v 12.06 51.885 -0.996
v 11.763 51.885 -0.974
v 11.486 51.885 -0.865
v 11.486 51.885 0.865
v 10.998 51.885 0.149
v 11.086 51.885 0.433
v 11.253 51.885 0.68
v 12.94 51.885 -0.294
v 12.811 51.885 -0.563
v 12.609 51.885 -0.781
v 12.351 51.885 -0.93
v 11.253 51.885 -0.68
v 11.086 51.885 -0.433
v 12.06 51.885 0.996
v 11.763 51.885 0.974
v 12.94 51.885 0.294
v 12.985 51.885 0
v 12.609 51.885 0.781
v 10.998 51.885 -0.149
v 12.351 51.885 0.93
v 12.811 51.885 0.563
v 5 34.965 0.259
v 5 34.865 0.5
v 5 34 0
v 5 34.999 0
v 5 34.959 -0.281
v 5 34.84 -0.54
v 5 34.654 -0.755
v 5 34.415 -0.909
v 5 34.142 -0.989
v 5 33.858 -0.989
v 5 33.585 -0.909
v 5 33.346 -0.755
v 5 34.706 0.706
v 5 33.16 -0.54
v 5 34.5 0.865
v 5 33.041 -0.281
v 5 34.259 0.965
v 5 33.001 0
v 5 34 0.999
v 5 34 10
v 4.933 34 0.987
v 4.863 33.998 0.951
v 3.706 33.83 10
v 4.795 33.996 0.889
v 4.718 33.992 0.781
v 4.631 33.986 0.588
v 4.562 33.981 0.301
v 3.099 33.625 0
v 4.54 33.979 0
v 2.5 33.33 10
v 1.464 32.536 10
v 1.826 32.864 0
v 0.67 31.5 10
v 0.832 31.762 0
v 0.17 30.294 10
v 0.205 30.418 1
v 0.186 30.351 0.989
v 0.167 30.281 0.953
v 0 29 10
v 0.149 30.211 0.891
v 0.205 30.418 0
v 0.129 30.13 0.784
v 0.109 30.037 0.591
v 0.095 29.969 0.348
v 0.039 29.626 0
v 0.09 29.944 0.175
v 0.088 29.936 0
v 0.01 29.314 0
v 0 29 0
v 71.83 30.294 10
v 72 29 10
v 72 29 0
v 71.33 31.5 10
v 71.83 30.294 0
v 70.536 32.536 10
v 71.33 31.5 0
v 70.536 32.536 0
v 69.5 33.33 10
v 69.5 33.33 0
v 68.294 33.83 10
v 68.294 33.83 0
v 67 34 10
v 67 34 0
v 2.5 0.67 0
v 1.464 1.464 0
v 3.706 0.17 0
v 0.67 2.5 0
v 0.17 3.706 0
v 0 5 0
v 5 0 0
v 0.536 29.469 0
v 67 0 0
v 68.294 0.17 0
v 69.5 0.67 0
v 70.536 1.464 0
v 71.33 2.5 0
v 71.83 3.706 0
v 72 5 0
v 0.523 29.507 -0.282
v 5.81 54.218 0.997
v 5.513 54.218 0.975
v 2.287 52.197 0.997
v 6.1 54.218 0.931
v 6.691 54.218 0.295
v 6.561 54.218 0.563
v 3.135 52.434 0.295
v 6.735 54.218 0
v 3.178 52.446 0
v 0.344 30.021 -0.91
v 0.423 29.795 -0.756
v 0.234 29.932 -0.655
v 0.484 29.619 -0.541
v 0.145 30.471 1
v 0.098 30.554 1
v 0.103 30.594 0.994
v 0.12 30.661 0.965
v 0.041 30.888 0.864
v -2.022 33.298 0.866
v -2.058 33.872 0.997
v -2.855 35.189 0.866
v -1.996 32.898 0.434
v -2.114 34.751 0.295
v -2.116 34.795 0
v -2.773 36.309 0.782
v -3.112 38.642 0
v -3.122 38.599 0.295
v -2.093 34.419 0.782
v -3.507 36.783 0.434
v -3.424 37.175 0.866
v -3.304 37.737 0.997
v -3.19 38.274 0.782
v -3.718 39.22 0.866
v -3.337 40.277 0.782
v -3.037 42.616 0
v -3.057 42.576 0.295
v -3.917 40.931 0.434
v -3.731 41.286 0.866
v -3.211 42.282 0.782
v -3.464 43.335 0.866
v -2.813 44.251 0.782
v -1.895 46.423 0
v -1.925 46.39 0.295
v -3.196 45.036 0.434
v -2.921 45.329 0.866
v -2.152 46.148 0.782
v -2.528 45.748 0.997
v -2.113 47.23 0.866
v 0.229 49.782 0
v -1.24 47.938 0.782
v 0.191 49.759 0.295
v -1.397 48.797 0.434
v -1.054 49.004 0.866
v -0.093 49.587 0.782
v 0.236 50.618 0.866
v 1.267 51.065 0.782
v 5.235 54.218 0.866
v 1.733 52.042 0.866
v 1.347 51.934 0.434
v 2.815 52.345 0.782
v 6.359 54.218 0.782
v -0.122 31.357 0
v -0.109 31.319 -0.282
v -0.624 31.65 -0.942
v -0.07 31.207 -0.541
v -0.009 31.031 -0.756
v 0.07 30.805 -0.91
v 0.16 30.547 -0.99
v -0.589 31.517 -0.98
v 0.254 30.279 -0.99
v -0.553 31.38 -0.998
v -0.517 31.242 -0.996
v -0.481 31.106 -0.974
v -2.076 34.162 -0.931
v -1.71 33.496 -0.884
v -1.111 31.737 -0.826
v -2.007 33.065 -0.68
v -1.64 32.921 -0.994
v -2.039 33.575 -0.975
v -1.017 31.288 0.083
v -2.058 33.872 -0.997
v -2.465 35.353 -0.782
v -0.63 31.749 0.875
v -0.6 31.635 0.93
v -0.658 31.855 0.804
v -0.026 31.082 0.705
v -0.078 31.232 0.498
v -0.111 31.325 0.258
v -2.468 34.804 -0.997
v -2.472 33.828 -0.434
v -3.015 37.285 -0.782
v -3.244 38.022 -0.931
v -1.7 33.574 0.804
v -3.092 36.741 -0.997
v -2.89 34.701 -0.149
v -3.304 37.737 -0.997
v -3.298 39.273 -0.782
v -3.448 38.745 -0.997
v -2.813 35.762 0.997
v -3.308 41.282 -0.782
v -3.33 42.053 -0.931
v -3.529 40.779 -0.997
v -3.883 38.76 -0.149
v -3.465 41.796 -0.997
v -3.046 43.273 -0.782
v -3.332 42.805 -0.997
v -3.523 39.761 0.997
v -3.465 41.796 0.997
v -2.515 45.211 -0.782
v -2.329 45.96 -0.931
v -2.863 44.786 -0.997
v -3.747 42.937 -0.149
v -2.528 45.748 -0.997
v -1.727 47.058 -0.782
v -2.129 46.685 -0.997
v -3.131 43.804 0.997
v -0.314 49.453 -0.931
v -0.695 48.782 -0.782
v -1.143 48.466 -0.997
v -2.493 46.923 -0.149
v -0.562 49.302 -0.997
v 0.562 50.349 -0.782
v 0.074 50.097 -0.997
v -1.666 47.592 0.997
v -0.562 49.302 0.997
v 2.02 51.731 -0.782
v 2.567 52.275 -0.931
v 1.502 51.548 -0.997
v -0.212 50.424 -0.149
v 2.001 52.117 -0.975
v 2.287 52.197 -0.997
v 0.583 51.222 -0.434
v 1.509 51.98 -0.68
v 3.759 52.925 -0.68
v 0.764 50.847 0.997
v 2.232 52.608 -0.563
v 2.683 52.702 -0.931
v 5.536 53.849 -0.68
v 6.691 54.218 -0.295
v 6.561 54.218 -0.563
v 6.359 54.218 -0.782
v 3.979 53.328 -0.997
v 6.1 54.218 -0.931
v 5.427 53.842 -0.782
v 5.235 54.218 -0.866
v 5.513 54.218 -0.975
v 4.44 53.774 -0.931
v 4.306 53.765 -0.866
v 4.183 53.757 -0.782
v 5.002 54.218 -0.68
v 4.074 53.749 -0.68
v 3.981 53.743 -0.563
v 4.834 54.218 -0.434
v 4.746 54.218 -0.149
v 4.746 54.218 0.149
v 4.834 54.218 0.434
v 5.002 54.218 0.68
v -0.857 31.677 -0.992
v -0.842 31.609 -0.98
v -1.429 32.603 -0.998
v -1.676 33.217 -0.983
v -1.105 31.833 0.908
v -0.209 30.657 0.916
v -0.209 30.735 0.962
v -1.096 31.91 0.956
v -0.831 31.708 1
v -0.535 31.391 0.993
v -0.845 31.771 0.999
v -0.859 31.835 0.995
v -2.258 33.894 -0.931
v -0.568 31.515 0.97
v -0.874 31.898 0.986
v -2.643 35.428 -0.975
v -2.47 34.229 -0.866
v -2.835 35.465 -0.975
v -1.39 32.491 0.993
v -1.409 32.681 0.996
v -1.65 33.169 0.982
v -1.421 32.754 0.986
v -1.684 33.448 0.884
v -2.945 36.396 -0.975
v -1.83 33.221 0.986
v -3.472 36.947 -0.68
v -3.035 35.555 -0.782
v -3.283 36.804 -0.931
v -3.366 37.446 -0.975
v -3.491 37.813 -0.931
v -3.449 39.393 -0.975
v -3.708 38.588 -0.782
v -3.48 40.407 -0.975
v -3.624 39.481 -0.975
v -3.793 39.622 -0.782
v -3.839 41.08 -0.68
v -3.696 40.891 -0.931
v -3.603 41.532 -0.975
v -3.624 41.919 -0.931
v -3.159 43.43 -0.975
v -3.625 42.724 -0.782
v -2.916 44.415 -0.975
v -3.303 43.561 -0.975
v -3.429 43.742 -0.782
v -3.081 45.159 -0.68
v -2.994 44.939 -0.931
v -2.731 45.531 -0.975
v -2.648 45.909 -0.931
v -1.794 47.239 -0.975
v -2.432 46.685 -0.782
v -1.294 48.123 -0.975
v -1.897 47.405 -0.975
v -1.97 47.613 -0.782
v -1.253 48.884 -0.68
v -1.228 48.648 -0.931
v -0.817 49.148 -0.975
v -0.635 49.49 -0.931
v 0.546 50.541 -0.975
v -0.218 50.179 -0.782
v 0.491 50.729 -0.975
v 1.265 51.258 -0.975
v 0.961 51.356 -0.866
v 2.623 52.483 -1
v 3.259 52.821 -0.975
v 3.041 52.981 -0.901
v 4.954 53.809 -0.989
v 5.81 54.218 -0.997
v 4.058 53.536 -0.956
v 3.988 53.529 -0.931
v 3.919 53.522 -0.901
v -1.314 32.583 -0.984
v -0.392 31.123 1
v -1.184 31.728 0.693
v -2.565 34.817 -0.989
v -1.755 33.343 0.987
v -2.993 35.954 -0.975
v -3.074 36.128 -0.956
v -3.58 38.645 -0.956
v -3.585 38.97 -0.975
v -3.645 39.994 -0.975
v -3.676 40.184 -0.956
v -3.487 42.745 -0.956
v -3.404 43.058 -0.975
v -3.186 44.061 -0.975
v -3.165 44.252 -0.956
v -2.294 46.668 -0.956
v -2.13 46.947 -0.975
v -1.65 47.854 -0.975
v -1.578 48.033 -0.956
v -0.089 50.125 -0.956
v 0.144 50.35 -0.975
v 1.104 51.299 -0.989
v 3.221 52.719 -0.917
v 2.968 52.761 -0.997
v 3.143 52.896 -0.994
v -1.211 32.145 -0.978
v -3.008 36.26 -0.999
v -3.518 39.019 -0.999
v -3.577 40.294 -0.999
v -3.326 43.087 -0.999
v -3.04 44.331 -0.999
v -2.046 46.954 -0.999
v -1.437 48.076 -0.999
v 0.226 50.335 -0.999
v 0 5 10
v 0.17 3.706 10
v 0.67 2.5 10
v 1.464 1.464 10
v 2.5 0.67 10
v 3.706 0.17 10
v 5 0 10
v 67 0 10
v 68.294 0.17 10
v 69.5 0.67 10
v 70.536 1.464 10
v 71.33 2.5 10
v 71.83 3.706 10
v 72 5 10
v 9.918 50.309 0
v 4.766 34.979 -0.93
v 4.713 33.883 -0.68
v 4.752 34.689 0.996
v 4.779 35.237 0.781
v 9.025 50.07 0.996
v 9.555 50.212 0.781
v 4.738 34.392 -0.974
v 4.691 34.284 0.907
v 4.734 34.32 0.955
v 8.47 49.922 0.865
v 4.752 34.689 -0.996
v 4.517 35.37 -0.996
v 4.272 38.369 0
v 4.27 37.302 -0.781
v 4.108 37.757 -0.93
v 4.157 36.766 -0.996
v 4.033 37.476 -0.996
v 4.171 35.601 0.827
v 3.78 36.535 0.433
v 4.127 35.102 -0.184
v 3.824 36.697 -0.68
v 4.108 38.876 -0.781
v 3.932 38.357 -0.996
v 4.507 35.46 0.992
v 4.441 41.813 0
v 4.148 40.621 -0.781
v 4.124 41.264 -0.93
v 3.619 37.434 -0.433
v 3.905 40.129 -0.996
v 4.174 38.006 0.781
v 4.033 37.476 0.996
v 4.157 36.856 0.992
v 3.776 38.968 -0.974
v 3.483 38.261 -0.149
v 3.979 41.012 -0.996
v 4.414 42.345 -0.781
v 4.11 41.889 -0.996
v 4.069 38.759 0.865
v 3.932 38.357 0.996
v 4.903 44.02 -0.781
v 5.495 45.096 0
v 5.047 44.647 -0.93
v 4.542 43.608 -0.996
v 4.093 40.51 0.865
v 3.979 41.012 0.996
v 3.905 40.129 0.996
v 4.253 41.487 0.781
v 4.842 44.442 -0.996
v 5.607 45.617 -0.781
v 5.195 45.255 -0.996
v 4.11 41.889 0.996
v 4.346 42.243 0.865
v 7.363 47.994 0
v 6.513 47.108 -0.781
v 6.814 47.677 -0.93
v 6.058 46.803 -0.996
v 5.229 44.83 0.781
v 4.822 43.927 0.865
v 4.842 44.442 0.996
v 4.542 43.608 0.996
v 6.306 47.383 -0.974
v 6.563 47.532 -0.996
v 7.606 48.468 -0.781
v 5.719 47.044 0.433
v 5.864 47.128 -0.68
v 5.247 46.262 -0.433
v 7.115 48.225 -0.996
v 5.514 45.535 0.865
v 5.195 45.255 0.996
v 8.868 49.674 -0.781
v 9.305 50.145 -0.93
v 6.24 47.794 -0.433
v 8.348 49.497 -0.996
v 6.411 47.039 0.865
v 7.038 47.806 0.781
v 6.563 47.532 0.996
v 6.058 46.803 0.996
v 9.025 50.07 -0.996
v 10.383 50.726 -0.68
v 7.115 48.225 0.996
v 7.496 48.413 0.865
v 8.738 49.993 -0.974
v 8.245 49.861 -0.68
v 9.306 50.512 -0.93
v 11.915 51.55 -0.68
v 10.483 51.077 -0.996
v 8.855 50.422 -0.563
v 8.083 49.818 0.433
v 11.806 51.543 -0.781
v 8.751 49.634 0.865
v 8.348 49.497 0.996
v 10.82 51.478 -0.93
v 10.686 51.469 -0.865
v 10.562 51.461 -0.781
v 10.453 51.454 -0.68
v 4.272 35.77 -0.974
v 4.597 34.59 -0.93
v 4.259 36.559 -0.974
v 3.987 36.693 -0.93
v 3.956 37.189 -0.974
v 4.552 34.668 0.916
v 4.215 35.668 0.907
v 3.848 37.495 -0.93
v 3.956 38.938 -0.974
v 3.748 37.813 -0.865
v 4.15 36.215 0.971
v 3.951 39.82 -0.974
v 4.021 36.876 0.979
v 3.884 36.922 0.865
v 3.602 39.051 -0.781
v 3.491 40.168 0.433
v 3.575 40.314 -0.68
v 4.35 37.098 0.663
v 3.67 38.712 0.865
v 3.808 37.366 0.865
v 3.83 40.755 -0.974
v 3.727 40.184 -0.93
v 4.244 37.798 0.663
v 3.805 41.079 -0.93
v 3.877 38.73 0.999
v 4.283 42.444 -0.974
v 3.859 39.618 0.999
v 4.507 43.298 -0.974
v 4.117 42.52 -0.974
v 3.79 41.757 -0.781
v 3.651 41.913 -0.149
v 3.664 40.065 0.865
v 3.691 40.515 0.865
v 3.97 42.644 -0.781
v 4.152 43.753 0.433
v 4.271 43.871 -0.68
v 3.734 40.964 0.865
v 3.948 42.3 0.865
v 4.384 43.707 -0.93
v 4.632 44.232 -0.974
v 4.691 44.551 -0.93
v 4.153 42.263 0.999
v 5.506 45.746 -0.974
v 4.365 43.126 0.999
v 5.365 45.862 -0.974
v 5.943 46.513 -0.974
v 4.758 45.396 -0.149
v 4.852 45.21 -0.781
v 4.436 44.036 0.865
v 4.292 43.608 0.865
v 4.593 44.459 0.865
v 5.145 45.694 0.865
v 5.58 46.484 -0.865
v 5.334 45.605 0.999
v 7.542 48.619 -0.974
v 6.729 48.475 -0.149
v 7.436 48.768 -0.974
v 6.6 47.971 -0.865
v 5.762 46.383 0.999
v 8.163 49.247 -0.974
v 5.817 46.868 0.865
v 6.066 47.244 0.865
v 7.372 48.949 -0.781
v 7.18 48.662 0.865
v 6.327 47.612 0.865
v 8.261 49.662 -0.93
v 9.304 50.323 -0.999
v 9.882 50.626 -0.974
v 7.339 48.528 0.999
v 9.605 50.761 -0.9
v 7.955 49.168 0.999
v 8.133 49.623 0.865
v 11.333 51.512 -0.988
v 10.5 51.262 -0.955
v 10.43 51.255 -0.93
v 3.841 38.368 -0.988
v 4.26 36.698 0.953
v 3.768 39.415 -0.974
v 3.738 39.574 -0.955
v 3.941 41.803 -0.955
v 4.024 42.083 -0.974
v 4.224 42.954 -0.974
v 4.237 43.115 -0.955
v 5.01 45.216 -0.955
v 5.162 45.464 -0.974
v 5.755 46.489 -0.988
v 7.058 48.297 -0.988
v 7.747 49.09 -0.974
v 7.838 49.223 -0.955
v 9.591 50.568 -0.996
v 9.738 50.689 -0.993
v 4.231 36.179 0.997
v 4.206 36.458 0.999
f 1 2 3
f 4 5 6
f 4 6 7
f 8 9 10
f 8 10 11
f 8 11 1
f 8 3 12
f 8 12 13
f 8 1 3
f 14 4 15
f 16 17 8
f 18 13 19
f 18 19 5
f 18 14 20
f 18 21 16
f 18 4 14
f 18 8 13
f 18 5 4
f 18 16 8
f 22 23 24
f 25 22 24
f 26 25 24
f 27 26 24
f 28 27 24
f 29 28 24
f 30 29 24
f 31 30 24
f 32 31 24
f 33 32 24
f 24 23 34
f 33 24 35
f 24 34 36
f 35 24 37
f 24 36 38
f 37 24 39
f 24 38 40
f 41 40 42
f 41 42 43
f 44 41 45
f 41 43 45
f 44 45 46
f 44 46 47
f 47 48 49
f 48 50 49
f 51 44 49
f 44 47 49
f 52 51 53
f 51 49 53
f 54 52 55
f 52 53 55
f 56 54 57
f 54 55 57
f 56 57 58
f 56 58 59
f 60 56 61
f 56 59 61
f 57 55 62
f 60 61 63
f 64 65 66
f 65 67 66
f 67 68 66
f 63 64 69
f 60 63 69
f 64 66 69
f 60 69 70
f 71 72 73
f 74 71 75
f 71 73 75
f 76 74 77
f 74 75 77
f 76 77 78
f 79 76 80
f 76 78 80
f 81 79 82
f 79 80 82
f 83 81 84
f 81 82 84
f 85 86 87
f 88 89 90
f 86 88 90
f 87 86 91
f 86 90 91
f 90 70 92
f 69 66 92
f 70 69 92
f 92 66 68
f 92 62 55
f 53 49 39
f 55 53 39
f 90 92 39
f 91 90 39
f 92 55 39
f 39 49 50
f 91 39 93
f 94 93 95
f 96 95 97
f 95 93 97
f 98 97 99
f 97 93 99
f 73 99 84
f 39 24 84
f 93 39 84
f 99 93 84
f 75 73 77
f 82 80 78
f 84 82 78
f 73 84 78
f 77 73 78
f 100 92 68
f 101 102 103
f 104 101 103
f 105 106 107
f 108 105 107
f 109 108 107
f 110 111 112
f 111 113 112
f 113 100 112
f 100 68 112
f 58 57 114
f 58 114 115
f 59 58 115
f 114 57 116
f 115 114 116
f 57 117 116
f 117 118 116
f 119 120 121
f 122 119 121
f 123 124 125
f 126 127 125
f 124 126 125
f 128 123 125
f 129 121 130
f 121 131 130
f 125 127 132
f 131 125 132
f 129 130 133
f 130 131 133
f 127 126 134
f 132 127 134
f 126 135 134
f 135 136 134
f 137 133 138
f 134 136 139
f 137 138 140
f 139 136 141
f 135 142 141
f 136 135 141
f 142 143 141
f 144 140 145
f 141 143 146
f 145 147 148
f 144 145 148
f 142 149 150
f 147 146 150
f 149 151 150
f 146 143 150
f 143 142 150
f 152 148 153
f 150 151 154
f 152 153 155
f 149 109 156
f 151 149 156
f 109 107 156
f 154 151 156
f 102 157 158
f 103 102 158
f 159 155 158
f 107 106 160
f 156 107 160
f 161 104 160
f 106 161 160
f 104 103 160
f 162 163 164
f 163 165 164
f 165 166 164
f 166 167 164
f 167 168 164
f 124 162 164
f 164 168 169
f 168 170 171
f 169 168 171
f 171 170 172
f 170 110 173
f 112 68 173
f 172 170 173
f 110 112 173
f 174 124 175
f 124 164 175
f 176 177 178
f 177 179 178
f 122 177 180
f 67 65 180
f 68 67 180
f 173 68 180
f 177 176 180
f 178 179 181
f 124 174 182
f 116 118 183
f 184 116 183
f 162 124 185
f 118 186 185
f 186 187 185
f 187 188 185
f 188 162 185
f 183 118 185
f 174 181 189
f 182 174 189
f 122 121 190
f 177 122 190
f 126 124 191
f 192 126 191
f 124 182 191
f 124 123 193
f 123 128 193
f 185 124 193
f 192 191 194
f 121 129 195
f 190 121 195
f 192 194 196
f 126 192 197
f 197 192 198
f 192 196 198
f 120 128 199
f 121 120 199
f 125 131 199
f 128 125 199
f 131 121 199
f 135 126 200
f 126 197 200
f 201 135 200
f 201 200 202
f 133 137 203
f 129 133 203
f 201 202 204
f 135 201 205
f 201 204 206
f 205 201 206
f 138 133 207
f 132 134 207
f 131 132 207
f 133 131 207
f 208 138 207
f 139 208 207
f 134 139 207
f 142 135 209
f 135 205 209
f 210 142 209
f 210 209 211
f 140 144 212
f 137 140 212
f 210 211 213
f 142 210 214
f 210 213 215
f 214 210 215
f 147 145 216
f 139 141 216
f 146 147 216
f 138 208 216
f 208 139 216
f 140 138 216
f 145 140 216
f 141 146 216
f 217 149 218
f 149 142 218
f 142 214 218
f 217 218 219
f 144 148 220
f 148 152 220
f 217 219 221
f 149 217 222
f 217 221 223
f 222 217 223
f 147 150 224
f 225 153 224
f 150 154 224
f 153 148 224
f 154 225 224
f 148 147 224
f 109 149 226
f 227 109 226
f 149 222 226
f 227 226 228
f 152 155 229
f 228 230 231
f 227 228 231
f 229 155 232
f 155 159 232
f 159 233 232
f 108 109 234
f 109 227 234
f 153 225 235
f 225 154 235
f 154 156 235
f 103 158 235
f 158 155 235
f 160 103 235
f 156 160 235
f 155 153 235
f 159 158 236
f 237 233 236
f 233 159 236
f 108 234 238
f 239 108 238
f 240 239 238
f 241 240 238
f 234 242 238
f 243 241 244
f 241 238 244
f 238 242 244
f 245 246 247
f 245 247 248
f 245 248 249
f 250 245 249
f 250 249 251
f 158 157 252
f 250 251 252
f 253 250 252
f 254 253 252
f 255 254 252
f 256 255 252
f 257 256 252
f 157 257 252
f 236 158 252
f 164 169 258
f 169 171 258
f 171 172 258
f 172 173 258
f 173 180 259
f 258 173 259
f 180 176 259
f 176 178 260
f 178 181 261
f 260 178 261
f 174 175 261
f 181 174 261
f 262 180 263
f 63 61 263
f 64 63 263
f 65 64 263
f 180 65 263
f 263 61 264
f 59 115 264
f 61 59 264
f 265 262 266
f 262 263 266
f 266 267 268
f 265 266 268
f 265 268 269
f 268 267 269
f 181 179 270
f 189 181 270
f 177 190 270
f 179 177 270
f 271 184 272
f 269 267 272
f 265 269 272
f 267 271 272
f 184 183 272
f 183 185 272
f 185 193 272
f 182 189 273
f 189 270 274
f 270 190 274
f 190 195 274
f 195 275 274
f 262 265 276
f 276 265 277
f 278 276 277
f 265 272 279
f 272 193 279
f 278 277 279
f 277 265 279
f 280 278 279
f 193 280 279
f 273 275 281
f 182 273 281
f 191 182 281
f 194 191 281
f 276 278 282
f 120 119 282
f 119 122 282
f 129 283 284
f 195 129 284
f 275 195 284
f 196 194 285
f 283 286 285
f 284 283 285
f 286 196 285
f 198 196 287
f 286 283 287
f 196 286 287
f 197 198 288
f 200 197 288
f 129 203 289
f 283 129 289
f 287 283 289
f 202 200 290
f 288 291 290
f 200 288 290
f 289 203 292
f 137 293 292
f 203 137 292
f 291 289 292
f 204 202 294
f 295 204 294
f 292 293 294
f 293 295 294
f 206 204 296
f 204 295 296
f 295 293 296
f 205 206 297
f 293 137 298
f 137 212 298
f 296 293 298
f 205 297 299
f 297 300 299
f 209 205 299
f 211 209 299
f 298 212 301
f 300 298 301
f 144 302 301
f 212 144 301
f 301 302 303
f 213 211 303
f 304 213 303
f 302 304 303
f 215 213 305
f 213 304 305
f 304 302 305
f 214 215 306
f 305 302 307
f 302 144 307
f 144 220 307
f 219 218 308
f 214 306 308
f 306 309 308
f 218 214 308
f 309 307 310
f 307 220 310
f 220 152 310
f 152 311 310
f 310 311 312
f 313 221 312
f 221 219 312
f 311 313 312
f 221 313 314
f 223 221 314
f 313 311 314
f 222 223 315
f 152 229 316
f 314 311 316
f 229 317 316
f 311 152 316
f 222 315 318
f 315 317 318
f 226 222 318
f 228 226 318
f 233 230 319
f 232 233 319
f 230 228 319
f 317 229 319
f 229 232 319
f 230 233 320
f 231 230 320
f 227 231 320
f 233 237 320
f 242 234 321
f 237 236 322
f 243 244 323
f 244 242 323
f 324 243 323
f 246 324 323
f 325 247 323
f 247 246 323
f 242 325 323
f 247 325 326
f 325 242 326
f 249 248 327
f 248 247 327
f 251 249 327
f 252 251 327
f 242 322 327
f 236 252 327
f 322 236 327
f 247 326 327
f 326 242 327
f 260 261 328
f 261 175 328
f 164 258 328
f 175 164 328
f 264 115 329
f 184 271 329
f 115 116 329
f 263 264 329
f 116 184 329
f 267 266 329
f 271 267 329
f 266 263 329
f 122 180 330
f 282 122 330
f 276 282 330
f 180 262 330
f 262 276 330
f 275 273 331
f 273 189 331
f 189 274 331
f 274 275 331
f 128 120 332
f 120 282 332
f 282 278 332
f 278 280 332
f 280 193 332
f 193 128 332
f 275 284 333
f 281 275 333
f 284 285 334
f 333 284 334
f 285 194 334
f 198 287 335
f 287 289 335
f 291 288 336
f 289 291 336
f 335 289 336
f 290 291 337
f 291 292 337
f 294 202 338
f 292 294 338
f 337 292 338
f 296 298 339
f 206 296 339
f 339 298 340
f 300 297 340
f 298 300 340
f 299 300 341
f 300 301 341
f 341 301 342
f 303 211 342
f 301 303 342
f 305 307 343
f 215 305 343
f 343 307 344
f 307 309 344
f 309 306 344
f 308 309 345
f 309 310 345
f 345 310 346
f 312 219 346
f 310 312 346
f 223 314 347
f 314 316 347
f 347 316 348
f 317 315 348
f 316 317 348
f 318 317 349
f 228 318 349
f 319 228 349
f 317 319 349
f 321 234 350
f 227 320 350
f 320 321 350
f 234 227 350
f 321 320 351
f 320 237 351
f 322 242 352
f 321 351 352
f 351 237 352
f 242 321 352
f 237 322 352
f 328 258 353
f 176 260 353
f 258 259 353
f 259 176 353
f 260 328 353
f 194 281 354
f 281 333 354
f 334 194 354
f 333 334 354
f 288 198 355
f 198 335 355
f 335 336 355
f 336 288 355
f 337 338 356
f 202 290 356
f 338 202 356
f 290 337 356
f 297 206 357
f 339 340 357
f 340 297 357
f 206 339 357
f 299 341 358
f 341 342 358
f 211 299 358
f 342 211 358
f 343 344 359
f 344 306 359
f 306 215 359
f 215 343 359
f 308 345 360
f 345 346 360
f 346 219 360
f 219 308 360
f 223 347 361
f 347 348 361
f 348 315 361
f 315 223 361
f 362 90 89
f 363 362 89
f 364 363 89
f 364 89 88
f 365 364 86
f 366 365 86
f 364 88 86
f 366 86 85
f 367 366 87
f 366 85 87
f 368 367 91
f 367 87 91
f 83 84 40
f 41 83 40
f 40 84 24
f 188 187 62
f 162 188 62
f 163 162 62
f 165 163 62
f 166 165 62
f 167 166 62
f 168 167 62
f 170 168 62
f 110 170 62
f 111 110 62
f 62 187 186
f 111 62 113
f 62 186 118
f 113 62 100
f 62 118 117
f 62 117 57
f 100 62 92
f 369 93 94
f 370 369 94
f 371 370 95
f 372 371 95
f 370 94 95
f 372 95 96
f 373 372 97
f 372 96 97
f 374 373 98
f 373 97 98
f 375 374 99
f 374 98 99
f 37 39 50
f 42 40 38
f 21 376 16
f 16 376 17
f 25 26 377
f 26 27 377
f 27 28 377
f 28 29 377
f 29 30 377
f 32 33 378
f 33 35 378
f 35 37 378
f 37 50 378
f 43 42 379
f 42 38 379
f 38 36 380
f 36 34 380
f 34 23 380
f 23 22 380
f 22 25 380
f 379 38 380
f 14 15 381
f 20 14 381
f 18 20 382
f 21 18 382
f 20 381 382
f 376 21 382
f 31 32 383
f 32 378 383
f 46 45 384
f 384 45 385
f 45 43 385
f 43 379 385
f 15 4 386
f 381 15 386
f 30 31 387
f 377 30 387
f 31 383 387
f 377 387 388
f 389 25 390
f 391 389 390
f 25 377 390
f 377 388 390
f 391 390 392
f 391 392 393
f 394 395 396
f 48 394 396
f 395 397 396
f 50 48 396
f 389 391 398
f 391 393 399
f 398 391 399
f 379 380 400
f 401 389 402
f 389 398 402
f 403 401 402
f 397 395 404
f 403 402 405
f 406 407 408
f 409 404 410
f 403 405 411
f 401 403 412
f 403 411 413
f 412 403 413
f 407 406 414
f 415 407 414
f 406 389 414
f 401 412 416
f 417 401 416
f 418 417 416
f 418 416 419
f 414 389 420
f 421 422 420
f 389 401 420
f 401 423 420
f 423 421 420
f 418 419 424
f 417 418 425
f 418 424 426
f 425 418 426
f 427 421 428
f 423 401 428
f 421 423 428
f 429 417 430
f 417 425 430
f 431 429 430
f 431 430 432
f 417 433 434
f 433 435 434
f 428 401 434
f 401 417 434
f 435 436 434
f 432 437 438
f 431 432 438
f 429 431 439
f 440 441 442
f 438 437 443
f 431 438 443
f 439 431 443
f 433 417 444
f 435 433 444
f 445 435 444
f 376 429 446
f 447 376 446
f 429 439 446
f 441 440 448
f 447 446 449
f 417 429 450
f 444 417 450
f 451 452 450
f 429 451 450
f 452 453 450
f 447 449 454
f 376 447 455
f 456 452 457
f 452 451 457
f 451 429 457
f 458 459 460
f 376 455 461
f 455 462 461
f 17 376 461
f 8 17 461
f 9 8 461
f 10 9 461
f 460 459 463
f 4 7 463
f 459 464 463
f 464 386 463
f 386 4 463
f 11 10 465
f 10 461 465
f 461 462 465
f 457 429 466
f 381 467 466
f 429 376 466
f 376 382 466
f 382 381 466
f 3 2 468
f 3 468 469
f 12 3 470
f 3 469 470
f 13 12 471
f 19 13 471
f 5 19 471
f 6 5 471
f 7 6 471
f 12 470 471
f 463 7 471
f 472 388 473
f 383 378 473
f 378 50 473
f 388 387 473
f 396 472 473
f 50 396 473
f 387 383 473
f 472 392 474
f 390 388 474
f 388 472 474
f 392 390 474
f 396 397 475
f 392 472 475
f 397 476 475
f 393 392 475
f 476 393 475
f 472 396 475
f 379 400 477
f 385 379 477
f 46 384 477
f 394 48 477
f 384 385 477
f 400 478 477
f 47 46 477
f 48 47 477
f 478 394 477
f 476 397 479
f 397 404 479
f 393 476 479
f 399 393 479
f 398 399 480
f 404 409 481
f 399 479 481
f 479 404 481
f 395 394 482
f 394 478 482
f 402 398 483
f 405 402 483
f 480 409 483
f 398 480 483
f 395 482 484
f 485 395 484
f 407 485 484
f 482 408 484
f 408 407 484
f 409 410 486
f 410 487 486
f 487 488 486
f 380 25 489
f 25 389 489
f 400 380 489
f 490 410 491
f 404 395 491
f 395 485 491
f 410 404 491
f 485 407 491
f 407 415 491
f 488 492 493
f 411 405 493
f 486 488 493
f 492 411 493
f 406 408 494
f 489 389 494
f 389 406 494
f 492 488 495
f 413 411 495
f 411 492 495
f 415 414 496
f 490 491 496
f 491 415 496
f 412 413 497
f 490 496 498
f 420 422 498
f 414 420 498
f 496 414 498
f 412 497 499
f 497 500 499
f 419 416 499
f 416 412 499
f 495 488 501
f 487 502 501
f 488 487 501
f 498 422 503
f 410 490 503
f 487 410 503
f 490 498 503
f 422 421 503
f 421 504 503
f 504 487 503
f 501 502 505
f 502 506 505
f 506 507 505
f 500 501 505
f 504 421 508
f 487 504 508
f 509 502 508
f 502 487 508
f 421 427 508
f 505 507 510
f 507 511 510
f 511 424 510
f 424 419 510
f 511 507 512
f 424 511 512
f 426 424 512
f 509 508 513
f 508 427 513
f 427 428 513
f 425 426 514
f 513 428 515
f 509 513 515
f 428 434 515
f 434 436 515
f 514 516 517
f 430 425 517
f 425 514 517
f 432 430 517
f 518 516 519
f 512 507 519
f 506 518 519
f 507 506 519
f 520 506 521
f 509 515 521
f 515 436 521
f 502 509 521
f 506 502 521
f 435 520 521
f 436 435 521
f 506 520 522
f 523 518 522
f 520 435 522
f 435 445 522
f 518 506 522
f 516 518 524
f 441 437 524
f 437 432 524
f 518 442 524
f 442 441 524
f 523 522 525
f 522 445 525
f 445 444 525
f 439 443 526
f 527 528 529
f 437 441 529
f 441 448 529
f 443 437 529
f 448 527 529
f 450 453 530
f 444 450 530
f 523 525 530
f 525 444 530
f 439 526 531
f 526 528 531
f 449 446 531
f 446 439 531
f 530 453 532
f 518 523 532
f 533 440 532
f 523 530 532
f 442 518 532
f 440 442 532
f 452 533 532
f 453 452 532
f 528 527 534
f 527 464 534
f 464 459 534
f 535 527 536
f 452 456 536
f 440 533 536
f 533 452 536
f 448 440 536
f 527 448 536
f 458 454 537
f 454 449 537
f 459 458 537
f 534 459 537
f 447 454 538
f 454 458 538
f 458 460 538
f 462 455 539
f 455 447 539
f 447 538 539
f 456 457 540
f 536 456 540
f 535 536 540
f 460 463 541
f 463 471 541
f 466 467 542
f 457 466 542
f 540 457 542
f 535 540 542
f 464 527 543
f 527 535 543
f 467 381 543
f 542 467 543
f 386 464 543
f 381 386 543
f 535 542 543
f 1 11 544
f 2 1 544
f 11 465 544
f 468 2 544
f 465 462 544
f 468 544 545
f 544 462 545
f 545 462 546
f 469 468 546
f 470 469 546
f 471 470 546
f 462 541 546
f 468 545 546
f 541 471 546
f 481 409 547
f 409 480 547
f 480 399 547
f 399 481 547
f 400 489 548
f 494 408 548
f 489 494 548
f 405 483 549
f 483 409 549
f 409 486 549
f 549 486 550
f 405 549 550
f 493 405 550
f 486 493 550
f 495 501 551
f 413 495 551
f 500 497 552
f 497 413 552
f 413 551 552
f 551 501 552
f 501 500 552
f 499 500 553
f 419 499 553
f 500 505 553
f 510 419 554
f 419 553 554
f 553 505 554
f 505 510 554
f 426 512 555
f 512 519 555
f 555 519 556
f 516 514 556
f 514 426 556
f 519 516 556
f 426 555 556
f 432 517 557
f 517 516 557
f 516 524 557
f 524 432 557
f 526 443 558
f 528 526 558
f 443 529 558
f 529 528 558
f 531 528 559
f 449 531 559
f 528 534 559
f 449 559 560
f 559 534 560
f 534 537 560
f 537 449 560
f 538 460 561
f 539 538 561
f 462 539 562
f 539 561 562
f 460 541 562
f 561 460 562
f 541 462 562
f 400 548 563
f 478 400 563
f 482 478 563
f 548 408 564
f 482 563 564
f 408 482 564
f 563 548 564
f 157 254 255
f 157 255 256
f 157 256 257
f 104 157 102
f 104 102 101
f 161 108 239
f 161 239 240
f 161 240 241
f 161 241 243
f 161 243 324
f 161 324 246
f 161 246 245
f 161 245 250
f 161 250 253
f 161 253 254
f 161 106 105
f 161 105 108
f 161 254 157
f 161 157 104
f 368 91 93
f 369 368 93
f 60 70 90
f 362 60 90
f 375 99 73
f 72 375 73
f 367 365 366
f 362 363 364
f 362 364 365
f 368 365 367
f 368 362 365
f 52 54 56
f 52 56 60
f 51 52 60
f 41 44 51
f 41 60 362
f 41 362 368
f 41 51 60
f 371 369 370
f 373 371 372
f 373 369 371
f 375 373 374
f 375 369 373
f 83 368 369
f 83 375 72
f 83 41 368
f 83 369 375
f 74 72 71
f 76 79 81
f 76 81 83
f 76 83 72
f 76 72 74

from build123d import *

# Parameters (mm, degrees)
SALIENTE_EXTRUIR1_DEPTH = 10
CROQUIS4_R              = 1
CROQUIS7_R              = 0.999100302


with BuildPart() as part:
    # Croquis1 → Saliente-Extruir1 (new body)
    with BuildSketch(Plane.XY):
        with BuildLine():
            Line((5, 0), (67, 0))
            ThreePointArc((67, 0), (70.535533906, 1.464466094), (72, 5))
            Line((72, 5), (72, 29))
            ThreePointArc((72, 29), (70.535533906, 32.535533906), (67, 34))
            Line((67, 34), (5, 34))
            ThreePointArc((5, 34), (1.464466094, 32.535533906), (0, 29))
            Line((0, 29), (0, 5))
            ThreePointArc((0, 5), (1.464466094, 1.464466094), (5, 0))
        make_face()
    extrude(amount=SALIENTE_EXTRUIR1_DEPTH)

    # Barrer1: sweep along a path in Croquis3
    with BuildLine(Plane(origin=(0, 0, 0), x_dir=(-1, 0, 0), z_dir=(0, 0, -1))) as barrer1_path:
        ThreePointArc((-0.205298063, 30.418038551), (3.171388104, 43.747173205), (-5.740387444, 54.218471915))
    # Croquis4 → Barrer1 (sweep)
    with BuildSketch(Plane(origin=(0, 54.218471915, 0), x_dir=(1, 0, 0), z_dir=(0, 1, 0))):
        with Locations((5.735070399, 0)):
            Circle(CROQUIS4_R)
    sweep(path=barrer1_path.line)

    # Barrer4: sweep along a path in Croquis6
    with BuildLine(Plane(origin=(0, 0, 0), x_dir=(-1, 0, 0), z_dir=(0, 0, -1))) as barrer4_path:
        ThreePointArc((-5, 34), (-4.788739539, 44.389346101), (-11.985732915, 51.885106885))
    # Croquis7 → Barrer4 (sweep)
    with BuildSketch(Plane(origin=(0, 51.885106885, 0), x_dir=(1, 0, 0), z_dir=(0, 1, 0))):
        with Locations((11.985732915, 0)):
            Circle(CROQUIS7_R)
    sweep(path=barrer4_path.line)


solid = part.part
